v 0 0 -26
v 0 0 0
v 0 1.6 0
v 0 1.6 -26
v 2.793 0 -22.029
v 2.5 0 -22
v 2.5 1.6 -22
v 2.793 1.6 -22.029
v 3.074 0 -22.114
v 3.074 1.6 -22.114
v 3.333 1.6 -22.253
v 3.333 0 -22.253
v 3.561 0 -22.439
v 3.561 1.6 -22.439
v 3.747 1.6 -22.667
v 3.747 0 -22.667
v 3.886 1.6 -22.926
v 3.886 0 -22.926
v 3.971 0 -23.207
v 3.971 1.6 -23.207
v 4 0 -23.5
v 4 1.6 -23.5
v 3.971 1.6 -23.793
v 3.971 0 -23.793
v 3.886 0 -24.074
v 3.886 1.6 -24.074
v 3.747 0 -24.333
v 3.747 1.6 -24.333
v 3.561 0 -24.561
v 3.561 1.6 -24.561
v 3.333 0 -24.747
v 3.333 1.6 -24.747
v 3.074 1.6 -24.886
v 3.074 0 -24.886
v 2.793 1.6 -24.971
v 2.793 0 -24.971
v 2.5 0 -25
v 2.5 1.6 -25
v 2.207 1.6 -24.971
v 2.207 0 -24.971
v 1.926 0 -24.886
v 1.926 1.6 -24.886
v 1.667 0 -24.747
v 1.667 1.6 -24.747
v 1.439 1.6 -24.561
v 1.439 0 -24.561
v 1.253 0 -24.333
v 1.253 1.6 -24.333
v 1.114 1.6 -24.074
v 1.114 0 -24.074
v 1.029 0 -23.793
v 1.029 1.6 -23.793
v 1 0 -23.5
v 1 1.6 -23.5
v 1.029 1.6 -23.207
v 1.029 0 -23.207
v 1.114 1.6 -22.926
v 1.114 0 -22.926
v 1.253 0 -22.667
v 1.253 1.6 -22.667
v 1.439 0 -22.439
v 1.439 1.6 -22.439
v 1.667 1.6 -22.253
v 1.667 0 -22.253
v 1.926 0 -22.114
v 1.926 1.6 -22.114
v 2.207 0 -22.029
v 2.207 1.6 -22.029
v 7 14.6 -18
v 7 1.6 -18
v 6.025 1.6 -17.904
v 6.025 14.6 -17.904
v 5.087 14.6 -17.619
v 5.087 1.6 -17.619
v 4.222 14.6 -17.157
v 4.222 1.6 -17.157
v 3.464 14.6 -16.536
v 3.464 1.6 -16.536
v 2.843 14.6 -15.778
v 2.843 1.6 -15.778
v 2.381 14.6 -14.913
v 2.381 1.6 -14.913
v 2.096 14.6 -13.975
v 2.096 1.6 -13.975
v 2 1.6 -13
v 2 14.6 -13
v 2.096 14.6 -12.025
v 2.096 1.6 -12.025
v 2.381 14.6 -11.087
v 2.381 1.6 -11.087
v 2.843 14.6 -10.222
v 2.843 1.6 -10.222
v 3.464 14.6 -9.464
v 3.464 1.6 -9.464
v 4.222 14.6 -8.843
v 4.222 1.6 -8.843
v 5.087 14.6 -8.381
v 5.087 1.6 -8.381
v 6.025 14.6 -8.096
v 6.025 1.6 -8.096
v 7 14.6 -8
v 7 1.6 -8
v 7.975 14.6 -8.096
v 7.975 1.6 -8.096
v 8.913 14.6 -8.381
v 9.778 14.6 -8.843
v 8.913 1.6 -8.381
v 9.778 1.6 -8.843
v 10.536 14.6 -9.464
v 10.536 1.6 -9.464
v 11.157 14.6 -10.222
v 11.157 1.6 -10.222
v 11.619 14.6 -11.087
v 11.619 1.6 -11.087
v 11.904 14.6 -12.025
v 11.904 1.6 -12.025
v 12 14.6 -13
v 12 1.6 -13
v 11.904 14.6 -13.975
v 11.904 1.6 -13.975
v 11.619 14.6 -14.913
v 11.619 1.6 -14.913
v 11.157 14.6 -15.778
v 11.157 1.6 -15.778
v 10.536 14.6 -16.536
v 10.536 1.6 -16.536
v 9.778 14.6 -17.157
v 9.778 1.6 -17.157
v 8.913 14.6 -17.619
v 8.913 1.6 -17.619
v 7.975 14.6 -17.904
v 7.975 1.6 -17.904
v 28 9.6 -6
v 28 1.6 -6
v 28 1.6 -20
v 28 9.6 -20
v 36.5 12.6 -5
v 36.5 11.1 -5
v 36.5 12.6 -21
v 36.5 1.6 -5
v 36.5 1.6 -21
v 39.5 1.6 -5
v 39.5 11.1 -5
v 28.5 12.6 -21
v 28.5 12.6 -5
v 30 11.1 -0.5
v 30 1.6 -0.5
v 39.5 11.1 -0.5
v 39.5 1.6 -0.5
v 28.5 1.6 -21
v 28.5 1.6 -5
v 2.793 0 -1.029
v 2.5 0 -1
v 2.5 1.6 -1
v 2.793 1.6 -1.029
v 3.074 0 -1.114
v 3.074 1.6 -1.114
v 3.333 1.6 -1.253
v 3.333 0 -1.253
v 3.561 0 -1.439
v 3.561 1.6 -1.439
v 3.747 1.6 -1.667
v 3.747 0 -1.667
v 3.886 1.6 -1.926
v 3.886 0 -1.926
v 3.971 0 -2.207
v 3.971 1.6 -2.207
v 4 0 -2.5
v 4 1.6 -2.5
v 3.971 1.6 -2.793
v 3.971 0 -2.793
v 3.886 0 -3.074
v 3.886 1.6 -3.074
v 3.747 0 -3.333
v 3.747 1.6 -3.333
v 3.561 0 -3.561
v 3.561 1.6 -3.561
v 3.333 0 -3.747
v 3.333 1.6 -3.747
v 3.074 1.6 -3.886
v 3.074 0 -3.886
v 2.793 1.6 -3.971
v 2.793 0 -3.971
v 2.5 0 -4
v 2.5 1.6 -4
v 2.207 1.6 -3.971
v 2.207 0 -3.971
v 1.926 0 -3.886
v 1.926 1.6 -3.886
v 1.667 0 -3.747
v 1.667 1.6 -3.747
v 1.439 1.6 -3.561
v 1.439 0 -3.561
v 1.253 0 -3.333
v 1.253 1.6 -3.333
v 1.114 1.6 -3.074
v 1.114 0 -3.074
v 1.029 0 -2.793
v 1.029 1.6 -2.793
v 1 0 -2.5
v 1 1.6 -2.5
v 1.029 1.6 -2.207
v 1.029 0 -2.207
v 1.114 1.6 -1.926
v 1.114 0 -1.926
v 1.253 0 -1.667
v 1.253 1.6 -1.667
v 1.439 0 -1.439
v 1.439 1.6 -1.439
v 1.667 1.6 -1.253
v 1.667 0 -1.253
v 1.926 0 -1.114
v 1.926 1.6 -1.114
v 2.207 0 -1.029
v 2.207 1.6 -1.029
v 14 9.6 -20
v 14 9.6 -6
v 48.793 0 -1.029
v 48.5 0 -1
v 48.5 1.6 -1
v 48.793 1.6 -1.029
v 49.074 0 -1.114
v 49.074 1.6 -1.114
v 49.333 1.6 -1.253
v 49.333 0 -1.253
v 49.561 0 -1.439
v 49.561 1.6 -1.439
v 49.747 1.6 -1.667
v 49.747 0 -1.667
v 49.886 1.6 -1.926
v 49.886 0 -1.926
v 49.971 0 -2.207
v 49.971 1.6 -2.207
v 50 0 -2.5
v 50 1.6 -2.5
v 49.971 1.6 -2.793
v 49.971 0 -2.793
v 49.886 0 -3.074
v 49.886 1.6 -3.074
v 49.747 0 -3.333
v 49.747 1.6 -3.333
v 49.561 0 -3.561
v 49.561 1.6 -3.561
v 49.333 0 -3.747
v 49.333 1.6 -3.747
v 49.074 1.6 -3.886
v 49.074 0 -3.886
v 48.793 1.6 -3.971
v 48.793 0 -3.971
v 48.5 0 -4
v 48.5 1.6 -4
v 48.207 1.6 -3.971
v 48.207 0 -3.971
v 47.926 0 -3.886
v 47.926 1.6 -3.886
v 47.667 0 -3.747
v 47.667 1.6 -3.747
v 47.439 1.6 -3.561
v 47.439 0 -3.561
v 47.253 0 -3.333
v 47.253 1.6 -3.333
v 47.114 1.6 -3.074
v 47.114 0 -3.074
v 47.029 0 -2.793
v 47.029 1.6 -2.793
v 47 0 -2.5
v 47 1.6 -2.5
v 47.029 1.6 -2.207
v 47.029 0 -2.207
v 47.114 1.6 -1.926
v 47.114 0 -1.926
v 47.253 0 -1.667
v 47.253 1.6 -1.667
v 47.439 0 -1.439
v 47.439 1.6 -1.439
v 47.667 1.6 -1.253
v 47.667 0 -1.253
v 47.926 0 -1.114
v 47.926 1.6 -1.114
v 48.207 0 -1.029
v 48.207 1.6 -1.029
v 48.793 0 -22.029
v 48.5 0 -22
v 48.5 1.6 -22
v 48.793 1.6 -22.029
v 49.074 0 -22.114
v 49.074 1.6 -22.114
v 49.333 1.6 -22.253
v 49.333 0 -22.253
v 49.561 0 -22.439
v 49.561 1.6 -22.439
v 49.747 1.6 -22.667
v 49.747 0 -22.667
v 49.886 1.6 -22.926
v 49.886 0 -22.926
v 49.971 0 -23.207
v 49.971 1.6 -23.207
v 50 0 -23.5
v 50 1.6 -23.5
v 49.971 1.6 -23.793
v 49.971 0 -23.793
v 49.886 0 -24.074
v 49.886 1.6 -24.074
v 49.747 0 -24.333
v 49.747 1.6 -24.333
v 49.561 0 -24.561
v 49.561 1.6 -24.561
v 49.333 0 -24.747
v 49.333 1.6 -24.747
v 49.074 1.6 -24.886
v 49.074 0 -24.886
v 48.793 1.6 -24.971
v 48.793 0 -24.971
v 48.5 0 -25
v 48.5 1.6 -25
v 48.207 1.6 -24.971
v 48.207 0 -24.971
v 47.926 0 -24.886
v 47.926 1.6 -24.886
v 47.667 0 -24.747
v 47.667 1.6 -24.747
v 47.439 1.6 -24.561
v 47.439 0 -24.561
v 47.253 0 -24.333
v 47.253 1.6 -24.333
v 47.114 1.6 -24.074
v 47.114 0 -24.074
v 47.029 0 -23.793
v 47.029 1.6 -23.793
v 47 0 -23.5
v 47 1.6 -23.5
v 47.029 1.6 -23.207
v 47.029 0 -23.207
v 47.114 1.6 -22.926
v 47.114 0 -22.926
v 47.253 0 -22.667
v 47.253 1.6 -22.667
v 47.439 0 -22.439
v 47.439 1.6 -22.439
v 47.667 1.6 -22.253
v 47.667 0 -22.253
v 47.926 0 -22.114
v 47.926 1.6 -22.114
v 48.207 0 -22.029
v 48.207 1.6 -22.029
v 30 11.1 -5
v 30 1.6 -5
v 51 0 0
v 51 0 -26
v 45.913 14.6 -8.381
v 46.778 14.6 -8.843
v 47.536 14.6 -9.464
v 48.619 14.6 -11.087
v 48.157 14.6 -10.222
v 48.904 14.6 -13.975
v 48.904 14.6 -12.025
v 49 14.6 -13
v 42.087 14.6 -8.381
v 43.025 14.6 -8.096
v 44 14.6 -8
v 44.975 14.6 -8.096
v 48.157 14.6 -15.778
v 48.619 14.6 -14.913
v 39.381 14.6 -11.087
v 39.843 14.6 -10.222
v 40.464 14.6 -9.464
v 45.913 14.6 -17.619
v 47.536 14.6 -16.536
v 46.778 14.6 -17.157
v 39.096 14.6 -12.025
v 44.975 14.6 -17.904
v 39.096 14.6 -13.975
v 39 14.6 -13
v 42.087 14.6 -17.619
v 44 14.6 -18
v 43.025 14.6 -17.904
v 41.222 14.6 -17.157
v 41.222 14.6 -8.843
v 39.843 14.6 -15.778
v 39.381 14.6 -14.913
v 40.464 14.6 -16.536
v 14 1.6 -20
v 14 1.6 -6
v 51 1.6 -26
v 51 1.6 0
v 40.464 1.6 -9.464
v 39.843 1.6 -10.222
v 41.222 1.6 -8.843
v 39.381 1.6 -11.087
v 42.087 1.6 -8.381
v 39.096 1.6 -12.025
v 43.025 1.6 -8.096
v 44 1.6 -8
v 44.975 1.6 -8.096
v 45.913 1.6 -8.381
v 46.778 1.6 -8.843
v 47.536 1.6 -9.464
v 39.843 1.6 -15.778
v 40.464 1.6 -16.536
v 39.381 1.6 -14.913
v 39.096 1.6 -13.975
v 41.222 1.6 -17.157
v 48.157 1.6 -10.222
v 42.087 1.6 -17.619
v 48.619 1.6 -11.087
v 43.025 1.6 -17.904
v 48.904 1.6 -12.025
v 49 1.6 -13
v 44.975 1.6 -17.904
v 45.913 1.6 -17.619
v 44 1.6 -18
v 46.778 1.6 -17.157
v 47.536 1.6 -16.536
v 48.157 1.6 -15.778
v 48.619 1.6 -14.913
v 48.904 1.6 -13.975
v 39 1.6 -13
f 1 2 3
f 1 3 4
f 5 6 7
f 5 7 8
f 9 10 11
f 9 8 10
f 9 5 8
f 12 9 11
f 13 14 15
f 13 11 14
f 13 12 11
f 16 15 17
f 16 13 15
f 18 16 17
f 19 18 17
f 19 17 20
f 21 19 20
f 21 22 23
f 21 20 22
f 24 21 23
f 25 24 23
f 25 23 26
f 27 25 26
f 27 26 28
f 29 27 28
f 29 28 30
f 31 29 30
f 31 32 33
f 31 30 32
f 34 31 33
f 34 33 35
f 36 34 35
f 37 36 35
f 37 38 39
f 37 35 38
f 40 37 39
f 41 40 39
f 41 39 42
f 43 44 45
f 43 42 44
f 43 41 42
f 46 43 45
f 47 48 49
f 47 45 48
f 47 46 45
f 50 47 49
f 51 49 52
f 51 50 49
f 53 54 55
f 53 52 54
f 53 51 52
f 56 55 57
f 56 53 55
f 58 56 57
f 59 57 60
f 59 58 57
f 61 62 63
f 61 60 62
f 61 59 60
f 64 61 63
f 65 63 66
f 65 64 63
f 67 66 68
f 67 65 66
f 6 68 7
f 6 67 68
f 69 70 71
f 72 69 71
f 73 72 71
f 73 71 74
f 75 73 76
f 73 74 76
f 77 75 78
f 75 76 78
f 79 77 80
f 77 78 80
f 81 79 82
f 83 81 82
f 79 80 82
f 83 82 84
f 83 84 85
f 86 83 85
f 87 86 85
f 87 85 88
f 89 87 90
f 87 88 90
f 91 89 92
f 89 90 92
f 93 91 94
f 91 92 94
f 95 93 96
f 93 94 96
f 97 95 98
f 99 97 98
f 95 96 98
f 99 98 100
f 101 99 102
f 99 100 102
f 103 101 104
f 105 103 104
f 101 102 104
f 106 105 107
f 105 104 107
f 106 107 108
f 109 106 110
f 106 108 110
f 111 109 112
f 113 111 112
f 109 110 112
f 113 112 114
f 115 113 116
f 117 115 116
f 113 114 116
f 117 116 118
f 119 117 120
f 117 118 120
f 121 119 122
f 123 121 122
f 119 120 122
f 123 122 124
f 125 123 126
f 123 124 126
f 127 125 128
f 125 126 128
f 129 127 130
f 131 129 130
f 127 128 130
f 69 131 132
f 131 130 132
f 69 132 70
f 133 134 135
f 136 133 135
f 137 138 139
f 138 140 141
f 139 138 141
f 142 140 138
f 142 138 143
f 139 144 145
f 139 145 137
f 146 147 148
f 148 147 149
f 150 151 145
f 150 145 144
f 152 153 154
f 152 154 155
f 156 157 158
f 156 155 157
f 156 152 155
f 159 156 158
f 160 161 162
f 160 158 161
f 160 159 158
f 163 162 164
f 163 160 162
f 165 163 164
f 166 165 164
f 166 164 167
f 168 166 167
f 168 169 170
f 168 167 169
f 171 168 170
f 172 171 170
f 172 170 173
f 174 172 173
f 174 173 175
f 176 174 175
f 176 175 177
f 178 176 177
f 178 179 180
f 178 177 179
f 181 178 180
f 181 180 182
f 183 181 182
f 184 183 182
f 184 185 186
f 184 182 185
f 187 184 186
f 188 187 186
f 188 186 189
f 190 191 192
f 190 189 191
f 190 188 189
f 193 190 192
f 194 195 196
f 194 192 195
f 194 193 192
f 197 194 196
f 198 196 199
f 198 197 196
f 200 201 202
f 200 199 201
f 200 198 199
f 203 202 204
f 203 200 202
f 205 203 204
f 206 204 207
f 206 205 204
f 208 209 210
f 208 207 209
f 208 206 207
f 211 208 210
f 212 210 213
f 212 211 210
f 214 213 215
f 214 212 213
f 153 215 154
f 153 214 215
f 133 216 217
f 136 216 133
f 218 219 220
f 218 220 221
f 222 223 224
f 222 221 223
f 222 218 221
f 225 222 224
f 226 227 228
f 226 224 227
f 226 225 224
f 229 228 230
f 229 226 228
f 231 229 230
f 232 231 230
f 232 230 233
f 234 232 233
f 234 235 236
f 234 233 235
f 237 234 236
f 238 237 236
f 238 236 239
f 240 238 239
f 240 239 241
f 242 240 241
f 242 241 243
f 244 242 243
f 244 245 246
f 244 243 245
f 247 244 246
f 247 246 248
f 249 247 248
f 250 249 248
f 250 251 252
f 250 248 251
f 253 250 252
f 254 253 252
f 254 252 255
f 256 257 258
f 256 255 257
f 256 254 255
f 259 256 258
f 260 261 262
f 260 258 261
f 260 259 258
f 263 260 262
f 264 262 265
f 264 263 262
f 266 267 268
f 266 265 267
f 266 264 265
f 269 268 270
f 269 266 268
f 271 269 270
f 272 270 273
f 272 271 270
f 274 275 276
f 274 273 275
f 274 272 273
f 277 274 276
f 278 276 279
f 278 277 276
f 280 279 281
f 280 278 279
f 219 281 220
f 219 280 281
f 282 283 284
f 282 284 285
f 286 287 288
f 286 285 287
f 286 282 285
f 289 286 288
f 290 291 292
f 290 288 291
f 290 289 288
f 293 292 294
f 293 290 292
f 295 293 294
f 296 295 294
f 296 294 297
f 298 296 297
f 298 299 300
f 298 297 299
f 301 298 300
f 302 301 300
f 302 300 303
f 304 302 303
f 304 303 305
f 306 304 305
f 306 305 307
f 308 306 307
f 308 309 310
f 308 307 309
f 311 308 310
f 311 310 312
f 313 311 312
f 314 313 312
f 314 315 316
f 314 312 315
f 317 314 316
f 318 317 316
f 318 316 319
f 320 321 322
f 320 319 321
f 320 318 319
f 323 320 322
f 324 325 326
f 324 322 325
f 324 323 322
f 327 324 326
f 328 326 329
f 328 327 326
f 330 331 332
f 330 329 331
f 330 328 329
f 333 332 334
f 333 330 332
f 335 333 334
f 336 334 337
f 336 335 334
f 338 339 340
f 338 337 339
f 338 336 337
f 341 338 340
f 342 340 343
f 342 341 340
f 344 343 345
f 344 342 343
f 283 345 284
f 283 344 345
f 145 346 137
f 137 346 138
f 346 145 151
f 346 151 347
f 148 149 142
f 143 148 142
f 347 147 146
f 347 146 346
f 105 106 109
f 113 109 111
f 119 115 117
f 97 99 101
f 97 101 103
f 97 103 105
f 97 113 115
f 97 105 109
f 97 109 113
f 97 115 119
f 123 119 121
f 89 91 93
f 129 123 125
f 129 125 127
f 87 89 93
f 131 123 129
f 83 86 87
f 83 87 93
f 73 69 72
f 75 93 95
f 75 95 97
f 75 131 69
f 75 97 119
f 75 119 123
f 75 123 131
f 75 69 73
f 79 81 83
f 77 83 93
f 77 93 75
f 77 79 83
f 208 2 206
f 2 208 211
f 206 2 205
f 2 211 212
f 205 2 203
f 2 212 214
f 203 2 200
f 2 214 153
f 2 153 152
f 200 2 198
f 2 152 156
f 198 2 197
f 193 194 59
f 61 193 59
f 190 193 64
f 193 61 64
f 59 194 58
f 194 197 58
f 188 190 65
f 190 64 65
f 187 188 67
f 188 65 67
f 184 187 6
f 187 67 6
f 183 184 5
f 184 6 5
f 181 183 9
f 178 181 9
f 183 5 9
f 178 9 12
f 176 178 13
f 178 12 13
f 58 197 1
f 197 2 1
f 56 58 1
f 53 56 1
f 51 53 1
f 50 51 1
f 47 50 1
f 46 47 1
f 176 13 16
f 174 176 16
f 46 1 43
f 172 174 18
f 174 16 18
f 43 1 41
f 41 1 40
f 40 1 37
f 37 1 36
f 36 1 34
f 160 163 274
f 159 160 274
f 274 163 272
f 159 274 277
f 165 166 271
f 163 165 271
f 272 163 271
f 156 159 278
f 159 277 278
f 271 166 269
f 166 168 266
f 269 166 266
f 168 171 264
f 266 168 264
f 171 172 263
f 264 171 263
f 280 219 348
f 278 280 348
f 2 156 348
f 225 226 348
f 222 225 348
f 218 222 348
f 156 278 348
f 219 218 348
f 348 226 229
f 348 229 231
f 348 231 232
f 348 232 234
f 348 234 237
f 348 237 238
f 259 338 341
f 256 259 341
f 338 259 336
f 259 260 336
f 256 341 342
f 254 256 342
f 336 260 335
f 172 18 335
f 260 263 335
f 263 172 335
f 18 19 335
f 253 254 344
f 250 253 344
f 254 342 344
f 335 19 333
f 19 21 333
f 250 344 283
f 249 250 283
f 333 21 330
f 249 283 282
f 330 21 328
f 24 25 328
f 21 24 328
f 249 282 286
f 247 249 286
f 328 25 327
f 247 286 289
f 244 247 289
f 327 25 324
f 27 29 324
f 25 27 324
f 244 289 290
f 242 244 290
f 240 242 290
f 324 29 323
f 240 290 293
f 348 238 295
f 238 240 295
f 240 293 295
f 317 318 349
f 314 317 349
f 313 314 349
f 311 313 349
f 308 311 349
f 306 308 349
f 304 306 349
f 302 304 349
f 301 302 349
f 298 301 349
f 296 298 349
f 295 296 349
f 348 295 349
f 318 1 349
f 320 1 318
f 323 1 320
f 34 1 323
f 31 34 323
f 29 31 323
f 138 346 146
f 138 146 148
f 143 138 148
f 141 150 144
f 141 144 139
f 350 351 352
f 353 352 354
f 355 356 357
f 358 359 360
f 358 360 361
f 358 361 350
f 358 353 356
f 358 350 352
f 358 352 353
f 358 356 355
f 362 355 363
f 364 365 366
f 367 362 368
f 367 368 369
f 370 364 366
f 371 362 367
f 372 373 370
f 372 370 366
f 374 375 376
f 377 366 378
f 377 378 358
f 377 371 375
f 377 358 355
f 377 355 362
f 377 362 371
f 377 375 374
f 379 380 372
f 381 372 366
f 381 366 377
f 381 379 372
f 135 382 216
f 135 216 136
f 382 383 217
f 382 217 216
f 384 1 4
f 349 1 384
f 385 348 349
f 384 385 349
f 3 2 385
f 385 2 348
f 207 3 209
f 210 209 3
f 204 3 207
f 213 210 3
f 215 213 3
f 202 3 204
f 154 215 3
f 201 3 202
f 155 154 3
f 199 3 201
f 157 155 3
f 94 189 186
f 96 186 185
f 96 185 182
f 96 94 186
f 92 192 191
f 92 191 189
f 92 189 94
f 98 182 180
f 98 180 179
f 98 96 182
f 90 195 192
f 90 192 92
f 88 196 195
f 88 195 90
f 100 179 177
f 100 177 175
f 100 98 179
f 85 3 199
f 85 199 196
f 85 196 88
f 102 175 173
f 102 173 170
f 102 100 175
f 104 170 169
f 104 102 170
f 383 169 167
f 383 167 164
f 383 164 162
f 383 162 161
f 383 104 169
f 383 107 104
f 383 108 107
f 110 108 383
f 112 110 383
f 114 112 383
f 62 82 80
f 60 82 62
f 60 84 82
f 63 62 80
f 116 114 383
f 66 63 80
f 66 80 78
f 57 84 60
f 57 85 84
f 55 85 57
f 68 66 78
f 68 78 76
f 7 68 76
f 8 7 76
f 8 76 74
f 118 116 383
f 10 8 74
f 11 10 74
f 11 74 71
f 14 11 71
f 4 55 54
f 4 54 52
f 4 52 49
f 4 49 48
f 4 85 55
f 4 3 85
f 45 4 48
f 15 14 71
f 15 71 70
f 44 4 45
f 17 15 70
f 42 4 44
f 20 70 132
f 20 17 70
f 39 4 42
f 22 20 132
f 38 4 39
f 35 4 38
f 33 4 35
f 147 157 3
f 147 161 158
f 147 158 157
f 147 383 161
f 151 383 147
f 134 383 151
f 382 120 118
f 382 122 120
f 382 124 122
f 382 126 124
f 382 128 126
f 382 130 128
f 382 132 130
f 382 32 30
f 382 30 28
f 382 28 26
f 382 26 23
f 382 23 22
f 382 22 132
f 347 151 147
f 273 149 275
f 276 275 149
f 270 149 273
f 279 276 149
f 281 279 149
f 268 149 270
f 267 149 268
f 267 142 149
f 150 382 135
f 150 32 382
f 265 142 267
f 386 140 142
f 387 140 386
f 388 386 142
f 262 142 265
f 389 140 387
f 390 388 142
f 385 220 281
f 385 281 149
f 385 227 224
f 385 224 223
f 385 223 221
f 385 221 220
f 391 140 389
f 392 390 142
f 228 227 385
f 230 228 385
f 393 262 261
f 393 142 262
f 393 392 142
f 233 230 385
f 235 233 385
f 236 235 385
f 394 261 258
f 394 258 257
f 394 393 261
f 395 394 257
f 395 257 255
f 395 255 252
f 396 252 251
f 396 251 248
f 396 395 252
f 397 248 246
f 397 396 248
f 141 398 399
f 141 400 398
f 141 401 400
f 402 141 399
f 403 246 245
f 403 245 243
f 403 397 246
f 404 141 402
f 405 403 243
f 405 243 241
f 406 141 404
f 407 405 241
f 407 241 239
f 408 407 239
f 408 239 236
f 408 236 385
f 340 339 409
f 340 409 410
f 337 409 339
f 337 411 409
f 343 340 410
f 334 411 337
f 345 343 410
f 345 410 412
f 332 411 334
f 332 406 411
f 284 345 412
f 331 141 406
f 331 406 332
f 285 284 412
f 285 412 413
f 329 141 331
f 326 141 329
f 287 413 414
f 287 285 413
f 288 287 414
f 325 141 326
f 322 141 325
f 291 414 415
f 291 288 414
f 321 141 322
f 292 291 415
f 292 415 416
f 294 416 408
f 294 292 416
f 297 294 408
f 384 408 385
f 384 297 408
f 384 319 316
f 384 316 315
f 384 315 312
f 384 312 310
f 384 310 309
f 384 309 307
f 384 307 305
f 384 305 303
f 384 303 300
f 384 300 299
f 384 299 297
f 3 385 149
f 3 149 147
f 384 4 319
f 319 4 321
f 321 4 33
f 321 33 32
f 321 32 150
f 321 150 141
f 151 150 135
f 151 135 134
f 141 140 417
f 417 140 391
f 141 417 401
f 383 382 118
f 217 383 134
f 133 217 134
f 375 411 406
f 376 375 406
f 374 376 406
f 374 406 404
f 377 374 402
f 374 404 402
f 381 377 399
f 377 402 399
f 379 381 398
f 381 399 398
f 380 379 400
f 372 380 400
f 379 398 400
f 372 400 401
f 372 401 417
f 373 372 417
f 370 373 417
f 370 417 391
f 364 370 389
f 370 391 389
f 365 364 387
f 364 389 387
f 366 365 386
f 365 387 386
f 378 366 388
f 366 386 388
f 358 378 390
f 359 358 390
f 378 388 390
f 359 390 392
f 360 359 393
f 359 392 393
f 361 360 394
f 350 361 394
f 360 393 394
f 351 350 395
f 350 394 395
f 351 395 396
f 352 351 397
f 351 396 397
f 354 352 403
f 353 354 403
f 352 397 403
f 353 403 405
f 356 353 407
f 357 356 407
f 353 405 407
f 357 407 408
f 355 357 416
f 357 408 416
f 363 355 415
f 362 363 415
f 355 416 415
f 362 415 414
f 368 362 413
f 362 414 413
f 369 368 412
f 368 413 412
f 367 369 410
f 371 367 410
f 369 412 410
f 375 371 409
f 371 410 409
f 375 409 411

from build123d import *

# Parameters (mm, degrees)
SKETCH1_W               = 51
SKETCH1_H               = 26
PCB_DEPTH               = 1.6
MOUNT_HOLE_1_DEPTH      = 58.267442758
MOUNT_HOLE_1_DEPTH_BACK = 58.267442758
SKETCH2_R               = 1.5
MOUNT_HOLE_2_DEPTH      = 58.267442758
MOUNT_HOLE_2_DEPTH_BACK = 58.267442758
SKETCH3_R               = 1.5
MOUNT_HOLE_3_DEPTH      = 58.267442758
MOUNT_HOLE_3_DEPTH_BACK = 58.267442758
SKETCH4_R               = 1.5
MOUNT_HOLE_4_DEPTH      = 58.267442758
MOUNT_HOLE_4_DEPTH_BACK = 58.267442758
SKETCH5_R               = 1.5
INDUCTOR_START          = 1.6
SKETCH6_W               = 14
SKETCH6_H               = 14
INDUCTOR_DEPTH          = 8
CAP_IN_START            = 1.6
SKETCH7_R               = 5
CAP_IN_DEPTH            = 13
CAP_OUT_START           = 1.6
SKETCH8_R               = 5
CAP_OUT_DEPTH           = 13
HEATSINK_START          = 1.6
SKETCH9_W               = 8
SKETCH9_H               = 16
HEATSINK_DEPTH          = 11
TRIM_POT_START          = 1.6
SKETCH10_W              = 9.5
SKETCH10_H              = 4.5
TRIM_POT_DEPTH          = 9.5


with BuildPart() as part:
    # Sketch1 → PCB (new body)
    with BuildSketch(Plane(origin=(0, 0, 0), x_dir=(1, 0, 0), z_dir=(0, 1, 0))):
        with Locations((25.5, 13)):
            Rectangle(SKETCH1_W, SKETCH1_H)
    extrude(amount=PCB_DEPTH)

    # Sketch2 → Mount_hole_1 (cut, two sides: drawn at the far end of the back side and taken through both)
    with BuildSketch(Plane(origin=(0, 0, 0), x_dir=(1, 0, 0), z_dir=(0, 1, 0)).offset(-MOUNT_HOLE_1_DEPTH_BACK)):
        with Locations(Location((2.5, 2.5, 0), (0, 0, 270))):
            Circle(SKETCH2_R)
    extrude(amount=MOUNT_HOLE_1_DEPTH + MOUNT_HOLE_1_DEPTH_BACK, mode=Mode.SUBTRACT)

    # Sketch3 → Mount_hole_2 (cut, two sides: drawn at the far end of the back side and taken through both)
    with BuildSketch(Plane(origin=(0, 0, 0), x_dir=(1, 0, 0), z_dir=(0, 1, 0)).offset(-MOUNT_HOLE_2_DEPTH_BACK)):
        with Locations(Location((48.5, 2.5, 0), (0, 0, 270))):
            Circle(SKETCH3_R)
    extrude(amount=MOUNT_HOLE_2_DEPTH + MOUNT_HOLE_2_DEPTH_BACK, mode=Mode.SUBTRACT)

    # Sketch4 → Mount_hole_3 (cut, two sides: drawn at the far end of the back side and taken through both)
    with BuildSketch(Plane(origin=(0, 0, 0), x_dir=(1, 0, 0), z_dir=(0, 1, 0)).offset(-MOUNT_HOLE_3_DEPTH_BACK)):
        with Locations(Location((2.5, 23.5, 0), (0, 0, 270))):
            Circle(SKETCH4_R)
    extrude(amount=MOUNT_HOLE_3_DEPTH + MOUNT_HOLE_3_DEPTH_BACK, mode=Mode.SUBTRACT)

    # Sketch5 → Mount_hole_4 (cut, two sides: drawn at the far end of the back side and taken through both)
    with BuildSketch(Plane(origin=(0, 0, 0), x_dir=(1, 0, 0), z_dir=(0, 1, 0)).offset(-MOUNT_HOLE_4_DEPTH_BACK)):
        with Locations(Location((48.5, 23.5, 0), (0, 0, 270))):
            Circle(SKETCH5_R)
    extrude(amount=MOUNT_HOLE_4_DEPTH + MOUNT_HOLE_4_DEPTH_BACK, mode=Mode.SUBTRACT)

    # Sketch6 → Inductor (add)
    with BuildSketch(Plane(origin=(0, 0, 0), x_dir=(1, 0, 0), z_dir=(0, 1, 0)).offset(INDUCTOR_START)):
        with Locations((21, 13)):
            Rectangle(SKETCH6_W, SKETCH6_H)
    extrude(amount=INDUCTOR_DEPTH)

    # Sketch7 → Cap_in (add)
    with BuildSketch(Plane(origin=(0, 0, 0), x_dir=(1, 0, 0), z_dir=(0, 1, 0)).offset(CAP_IN_START)):
        with Locations(Location((7, 13, 0), (0, 0, 90))):
            Circle(SKETCH7_R)
    extrude(amount=CAP_IN_DEPTH)

    # Sketch8 → Cap_out (add)
    with BuildSketch(Plane(origin=(0, 0, 0), x_dir=(1, 0, 0), z_dir=(0, 1, 0)).offset(CAP_OUT_START)):
        with Locations(Location((44, 13, 0), (0, 0, 90))):
            Circle(SKETCH8_R)
    extrude(amount=CAP_OUT_DEPTH)

    # Sketch9 → Heatsink (add)
    with BuildSketch(Plane(origin=(0, 0, 0), x_dir=(1, 0, 0), z_dir=(0, 1, 0)).offset(HEATSINK_START)):
        with Locations((32.5, 13)):
            Rectangle(SKETCH9_W, SKETCH9_H)
    extrude(amount=HEATSINK_DEPTH)

    # Sketch10 → Trim_pot (add)
    with BuildSketch(Plane(origin=(0, 0, 0), x_dir=(1, 0, 0), z_dir=(0, 1, 0)).offset(TRIM_POT_START)):
        with Locations((34.75, 2.75)):
            Rectangle(SKETCH10_W, SKETCH10_H)
    extrude(amount=TRIM_POT_DEPTH)


solid = part.part
